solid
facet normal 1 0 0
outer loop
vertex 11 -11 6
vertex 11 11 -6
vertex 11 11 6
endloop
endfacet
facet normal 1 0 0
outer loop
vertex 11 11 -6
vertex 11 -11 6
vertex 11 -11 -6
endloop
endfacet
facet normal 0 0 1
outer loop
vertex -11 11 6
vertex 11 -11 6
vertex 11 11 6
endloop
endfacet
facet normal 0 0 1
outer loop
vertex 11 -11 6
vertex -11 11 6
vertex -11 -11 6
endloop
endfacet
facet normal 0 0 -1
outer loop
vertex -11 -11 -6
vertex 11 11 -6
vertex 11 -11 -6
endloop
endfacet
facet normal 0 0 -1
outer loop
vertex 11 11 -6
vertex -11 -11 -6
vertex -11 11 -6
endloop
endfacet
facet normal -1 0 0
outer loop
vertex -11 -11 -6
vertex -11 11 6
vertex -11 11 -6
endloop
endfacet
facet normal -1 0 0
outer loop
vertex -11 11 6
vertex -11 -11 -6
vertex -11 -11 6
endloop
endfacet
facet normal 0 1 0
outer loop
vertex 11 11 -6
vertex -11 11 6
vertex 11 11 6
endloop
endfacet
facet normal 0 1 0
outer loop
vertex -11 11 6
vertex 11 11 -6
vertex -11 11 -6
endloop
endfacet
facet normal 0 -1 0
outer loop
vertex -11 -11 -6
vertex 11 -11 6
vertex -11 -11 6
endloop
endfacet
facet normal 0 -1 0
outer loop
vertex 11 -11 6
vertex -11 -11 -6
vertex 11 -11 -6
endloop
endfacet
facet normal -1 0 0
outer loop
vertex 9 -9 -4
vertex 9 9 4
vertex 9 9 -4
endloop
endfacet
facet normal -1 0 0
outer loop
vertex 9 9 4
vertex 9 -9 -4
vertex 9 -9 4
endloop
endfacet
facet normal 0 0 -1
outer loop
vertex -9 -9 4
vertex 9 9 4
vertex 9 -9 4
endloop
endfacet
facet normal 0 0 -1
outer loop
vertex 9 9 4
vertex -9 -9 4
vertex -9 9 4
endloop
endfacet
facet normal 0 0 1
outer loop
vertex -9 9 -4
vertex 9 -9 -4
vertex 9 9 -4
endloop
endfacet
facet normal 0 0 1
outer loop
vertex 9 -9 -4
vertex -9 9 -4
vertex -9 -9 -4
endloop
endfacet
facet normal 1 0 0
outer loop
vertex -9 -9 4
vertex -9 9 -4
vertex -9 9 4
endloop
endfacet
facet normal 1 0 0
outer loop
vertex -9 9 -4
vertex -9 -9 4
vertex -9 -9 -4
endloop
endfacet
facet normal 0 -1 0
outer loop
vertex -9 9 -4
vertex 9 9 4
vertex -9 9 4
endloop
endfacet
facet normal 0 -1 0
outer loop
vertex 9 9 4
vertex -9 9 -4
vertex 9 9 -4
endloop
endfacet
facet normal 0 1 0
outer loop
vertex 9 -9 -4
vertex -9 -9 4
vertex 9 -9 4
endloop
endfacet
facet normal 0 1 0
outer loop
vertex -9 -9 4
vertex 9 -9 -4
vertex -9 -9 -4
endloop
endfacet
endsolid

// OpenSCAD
// REPRESENTATIVE_ENCLOSURE — parameterized concept model
// Device: Edge I/O Rings (edge_io_rings)
// Status: REPRESENTATIVE_ENCLOSURE_PHYSICAL_PENDING
// Evidence class: MODELED (not MEASURED)

device_id = "edge_io_rings";
outer_w = 22;
outer_d = 22;
outer_h = 12;
wall = 2.0;
corner_r = 4.0;
tolerance = 0.3;

module outer_shell() {
  difference() {
    cube([outer_w, outer_d, outer_h], center=true);
    cube([outer_w-2*wall, outer_d-2*wall, outer_h-2*wall], center=true);
  }
}

module interference_keepout() {
  // Battery / PCB keepouts for digital interference check
  translate([0, 0, -outer_h/4]) cube([outer_w*0.6, outer_d*0.5, outer_h*0.35], center=true);
}

outer_shell();
%interference_keepout();
